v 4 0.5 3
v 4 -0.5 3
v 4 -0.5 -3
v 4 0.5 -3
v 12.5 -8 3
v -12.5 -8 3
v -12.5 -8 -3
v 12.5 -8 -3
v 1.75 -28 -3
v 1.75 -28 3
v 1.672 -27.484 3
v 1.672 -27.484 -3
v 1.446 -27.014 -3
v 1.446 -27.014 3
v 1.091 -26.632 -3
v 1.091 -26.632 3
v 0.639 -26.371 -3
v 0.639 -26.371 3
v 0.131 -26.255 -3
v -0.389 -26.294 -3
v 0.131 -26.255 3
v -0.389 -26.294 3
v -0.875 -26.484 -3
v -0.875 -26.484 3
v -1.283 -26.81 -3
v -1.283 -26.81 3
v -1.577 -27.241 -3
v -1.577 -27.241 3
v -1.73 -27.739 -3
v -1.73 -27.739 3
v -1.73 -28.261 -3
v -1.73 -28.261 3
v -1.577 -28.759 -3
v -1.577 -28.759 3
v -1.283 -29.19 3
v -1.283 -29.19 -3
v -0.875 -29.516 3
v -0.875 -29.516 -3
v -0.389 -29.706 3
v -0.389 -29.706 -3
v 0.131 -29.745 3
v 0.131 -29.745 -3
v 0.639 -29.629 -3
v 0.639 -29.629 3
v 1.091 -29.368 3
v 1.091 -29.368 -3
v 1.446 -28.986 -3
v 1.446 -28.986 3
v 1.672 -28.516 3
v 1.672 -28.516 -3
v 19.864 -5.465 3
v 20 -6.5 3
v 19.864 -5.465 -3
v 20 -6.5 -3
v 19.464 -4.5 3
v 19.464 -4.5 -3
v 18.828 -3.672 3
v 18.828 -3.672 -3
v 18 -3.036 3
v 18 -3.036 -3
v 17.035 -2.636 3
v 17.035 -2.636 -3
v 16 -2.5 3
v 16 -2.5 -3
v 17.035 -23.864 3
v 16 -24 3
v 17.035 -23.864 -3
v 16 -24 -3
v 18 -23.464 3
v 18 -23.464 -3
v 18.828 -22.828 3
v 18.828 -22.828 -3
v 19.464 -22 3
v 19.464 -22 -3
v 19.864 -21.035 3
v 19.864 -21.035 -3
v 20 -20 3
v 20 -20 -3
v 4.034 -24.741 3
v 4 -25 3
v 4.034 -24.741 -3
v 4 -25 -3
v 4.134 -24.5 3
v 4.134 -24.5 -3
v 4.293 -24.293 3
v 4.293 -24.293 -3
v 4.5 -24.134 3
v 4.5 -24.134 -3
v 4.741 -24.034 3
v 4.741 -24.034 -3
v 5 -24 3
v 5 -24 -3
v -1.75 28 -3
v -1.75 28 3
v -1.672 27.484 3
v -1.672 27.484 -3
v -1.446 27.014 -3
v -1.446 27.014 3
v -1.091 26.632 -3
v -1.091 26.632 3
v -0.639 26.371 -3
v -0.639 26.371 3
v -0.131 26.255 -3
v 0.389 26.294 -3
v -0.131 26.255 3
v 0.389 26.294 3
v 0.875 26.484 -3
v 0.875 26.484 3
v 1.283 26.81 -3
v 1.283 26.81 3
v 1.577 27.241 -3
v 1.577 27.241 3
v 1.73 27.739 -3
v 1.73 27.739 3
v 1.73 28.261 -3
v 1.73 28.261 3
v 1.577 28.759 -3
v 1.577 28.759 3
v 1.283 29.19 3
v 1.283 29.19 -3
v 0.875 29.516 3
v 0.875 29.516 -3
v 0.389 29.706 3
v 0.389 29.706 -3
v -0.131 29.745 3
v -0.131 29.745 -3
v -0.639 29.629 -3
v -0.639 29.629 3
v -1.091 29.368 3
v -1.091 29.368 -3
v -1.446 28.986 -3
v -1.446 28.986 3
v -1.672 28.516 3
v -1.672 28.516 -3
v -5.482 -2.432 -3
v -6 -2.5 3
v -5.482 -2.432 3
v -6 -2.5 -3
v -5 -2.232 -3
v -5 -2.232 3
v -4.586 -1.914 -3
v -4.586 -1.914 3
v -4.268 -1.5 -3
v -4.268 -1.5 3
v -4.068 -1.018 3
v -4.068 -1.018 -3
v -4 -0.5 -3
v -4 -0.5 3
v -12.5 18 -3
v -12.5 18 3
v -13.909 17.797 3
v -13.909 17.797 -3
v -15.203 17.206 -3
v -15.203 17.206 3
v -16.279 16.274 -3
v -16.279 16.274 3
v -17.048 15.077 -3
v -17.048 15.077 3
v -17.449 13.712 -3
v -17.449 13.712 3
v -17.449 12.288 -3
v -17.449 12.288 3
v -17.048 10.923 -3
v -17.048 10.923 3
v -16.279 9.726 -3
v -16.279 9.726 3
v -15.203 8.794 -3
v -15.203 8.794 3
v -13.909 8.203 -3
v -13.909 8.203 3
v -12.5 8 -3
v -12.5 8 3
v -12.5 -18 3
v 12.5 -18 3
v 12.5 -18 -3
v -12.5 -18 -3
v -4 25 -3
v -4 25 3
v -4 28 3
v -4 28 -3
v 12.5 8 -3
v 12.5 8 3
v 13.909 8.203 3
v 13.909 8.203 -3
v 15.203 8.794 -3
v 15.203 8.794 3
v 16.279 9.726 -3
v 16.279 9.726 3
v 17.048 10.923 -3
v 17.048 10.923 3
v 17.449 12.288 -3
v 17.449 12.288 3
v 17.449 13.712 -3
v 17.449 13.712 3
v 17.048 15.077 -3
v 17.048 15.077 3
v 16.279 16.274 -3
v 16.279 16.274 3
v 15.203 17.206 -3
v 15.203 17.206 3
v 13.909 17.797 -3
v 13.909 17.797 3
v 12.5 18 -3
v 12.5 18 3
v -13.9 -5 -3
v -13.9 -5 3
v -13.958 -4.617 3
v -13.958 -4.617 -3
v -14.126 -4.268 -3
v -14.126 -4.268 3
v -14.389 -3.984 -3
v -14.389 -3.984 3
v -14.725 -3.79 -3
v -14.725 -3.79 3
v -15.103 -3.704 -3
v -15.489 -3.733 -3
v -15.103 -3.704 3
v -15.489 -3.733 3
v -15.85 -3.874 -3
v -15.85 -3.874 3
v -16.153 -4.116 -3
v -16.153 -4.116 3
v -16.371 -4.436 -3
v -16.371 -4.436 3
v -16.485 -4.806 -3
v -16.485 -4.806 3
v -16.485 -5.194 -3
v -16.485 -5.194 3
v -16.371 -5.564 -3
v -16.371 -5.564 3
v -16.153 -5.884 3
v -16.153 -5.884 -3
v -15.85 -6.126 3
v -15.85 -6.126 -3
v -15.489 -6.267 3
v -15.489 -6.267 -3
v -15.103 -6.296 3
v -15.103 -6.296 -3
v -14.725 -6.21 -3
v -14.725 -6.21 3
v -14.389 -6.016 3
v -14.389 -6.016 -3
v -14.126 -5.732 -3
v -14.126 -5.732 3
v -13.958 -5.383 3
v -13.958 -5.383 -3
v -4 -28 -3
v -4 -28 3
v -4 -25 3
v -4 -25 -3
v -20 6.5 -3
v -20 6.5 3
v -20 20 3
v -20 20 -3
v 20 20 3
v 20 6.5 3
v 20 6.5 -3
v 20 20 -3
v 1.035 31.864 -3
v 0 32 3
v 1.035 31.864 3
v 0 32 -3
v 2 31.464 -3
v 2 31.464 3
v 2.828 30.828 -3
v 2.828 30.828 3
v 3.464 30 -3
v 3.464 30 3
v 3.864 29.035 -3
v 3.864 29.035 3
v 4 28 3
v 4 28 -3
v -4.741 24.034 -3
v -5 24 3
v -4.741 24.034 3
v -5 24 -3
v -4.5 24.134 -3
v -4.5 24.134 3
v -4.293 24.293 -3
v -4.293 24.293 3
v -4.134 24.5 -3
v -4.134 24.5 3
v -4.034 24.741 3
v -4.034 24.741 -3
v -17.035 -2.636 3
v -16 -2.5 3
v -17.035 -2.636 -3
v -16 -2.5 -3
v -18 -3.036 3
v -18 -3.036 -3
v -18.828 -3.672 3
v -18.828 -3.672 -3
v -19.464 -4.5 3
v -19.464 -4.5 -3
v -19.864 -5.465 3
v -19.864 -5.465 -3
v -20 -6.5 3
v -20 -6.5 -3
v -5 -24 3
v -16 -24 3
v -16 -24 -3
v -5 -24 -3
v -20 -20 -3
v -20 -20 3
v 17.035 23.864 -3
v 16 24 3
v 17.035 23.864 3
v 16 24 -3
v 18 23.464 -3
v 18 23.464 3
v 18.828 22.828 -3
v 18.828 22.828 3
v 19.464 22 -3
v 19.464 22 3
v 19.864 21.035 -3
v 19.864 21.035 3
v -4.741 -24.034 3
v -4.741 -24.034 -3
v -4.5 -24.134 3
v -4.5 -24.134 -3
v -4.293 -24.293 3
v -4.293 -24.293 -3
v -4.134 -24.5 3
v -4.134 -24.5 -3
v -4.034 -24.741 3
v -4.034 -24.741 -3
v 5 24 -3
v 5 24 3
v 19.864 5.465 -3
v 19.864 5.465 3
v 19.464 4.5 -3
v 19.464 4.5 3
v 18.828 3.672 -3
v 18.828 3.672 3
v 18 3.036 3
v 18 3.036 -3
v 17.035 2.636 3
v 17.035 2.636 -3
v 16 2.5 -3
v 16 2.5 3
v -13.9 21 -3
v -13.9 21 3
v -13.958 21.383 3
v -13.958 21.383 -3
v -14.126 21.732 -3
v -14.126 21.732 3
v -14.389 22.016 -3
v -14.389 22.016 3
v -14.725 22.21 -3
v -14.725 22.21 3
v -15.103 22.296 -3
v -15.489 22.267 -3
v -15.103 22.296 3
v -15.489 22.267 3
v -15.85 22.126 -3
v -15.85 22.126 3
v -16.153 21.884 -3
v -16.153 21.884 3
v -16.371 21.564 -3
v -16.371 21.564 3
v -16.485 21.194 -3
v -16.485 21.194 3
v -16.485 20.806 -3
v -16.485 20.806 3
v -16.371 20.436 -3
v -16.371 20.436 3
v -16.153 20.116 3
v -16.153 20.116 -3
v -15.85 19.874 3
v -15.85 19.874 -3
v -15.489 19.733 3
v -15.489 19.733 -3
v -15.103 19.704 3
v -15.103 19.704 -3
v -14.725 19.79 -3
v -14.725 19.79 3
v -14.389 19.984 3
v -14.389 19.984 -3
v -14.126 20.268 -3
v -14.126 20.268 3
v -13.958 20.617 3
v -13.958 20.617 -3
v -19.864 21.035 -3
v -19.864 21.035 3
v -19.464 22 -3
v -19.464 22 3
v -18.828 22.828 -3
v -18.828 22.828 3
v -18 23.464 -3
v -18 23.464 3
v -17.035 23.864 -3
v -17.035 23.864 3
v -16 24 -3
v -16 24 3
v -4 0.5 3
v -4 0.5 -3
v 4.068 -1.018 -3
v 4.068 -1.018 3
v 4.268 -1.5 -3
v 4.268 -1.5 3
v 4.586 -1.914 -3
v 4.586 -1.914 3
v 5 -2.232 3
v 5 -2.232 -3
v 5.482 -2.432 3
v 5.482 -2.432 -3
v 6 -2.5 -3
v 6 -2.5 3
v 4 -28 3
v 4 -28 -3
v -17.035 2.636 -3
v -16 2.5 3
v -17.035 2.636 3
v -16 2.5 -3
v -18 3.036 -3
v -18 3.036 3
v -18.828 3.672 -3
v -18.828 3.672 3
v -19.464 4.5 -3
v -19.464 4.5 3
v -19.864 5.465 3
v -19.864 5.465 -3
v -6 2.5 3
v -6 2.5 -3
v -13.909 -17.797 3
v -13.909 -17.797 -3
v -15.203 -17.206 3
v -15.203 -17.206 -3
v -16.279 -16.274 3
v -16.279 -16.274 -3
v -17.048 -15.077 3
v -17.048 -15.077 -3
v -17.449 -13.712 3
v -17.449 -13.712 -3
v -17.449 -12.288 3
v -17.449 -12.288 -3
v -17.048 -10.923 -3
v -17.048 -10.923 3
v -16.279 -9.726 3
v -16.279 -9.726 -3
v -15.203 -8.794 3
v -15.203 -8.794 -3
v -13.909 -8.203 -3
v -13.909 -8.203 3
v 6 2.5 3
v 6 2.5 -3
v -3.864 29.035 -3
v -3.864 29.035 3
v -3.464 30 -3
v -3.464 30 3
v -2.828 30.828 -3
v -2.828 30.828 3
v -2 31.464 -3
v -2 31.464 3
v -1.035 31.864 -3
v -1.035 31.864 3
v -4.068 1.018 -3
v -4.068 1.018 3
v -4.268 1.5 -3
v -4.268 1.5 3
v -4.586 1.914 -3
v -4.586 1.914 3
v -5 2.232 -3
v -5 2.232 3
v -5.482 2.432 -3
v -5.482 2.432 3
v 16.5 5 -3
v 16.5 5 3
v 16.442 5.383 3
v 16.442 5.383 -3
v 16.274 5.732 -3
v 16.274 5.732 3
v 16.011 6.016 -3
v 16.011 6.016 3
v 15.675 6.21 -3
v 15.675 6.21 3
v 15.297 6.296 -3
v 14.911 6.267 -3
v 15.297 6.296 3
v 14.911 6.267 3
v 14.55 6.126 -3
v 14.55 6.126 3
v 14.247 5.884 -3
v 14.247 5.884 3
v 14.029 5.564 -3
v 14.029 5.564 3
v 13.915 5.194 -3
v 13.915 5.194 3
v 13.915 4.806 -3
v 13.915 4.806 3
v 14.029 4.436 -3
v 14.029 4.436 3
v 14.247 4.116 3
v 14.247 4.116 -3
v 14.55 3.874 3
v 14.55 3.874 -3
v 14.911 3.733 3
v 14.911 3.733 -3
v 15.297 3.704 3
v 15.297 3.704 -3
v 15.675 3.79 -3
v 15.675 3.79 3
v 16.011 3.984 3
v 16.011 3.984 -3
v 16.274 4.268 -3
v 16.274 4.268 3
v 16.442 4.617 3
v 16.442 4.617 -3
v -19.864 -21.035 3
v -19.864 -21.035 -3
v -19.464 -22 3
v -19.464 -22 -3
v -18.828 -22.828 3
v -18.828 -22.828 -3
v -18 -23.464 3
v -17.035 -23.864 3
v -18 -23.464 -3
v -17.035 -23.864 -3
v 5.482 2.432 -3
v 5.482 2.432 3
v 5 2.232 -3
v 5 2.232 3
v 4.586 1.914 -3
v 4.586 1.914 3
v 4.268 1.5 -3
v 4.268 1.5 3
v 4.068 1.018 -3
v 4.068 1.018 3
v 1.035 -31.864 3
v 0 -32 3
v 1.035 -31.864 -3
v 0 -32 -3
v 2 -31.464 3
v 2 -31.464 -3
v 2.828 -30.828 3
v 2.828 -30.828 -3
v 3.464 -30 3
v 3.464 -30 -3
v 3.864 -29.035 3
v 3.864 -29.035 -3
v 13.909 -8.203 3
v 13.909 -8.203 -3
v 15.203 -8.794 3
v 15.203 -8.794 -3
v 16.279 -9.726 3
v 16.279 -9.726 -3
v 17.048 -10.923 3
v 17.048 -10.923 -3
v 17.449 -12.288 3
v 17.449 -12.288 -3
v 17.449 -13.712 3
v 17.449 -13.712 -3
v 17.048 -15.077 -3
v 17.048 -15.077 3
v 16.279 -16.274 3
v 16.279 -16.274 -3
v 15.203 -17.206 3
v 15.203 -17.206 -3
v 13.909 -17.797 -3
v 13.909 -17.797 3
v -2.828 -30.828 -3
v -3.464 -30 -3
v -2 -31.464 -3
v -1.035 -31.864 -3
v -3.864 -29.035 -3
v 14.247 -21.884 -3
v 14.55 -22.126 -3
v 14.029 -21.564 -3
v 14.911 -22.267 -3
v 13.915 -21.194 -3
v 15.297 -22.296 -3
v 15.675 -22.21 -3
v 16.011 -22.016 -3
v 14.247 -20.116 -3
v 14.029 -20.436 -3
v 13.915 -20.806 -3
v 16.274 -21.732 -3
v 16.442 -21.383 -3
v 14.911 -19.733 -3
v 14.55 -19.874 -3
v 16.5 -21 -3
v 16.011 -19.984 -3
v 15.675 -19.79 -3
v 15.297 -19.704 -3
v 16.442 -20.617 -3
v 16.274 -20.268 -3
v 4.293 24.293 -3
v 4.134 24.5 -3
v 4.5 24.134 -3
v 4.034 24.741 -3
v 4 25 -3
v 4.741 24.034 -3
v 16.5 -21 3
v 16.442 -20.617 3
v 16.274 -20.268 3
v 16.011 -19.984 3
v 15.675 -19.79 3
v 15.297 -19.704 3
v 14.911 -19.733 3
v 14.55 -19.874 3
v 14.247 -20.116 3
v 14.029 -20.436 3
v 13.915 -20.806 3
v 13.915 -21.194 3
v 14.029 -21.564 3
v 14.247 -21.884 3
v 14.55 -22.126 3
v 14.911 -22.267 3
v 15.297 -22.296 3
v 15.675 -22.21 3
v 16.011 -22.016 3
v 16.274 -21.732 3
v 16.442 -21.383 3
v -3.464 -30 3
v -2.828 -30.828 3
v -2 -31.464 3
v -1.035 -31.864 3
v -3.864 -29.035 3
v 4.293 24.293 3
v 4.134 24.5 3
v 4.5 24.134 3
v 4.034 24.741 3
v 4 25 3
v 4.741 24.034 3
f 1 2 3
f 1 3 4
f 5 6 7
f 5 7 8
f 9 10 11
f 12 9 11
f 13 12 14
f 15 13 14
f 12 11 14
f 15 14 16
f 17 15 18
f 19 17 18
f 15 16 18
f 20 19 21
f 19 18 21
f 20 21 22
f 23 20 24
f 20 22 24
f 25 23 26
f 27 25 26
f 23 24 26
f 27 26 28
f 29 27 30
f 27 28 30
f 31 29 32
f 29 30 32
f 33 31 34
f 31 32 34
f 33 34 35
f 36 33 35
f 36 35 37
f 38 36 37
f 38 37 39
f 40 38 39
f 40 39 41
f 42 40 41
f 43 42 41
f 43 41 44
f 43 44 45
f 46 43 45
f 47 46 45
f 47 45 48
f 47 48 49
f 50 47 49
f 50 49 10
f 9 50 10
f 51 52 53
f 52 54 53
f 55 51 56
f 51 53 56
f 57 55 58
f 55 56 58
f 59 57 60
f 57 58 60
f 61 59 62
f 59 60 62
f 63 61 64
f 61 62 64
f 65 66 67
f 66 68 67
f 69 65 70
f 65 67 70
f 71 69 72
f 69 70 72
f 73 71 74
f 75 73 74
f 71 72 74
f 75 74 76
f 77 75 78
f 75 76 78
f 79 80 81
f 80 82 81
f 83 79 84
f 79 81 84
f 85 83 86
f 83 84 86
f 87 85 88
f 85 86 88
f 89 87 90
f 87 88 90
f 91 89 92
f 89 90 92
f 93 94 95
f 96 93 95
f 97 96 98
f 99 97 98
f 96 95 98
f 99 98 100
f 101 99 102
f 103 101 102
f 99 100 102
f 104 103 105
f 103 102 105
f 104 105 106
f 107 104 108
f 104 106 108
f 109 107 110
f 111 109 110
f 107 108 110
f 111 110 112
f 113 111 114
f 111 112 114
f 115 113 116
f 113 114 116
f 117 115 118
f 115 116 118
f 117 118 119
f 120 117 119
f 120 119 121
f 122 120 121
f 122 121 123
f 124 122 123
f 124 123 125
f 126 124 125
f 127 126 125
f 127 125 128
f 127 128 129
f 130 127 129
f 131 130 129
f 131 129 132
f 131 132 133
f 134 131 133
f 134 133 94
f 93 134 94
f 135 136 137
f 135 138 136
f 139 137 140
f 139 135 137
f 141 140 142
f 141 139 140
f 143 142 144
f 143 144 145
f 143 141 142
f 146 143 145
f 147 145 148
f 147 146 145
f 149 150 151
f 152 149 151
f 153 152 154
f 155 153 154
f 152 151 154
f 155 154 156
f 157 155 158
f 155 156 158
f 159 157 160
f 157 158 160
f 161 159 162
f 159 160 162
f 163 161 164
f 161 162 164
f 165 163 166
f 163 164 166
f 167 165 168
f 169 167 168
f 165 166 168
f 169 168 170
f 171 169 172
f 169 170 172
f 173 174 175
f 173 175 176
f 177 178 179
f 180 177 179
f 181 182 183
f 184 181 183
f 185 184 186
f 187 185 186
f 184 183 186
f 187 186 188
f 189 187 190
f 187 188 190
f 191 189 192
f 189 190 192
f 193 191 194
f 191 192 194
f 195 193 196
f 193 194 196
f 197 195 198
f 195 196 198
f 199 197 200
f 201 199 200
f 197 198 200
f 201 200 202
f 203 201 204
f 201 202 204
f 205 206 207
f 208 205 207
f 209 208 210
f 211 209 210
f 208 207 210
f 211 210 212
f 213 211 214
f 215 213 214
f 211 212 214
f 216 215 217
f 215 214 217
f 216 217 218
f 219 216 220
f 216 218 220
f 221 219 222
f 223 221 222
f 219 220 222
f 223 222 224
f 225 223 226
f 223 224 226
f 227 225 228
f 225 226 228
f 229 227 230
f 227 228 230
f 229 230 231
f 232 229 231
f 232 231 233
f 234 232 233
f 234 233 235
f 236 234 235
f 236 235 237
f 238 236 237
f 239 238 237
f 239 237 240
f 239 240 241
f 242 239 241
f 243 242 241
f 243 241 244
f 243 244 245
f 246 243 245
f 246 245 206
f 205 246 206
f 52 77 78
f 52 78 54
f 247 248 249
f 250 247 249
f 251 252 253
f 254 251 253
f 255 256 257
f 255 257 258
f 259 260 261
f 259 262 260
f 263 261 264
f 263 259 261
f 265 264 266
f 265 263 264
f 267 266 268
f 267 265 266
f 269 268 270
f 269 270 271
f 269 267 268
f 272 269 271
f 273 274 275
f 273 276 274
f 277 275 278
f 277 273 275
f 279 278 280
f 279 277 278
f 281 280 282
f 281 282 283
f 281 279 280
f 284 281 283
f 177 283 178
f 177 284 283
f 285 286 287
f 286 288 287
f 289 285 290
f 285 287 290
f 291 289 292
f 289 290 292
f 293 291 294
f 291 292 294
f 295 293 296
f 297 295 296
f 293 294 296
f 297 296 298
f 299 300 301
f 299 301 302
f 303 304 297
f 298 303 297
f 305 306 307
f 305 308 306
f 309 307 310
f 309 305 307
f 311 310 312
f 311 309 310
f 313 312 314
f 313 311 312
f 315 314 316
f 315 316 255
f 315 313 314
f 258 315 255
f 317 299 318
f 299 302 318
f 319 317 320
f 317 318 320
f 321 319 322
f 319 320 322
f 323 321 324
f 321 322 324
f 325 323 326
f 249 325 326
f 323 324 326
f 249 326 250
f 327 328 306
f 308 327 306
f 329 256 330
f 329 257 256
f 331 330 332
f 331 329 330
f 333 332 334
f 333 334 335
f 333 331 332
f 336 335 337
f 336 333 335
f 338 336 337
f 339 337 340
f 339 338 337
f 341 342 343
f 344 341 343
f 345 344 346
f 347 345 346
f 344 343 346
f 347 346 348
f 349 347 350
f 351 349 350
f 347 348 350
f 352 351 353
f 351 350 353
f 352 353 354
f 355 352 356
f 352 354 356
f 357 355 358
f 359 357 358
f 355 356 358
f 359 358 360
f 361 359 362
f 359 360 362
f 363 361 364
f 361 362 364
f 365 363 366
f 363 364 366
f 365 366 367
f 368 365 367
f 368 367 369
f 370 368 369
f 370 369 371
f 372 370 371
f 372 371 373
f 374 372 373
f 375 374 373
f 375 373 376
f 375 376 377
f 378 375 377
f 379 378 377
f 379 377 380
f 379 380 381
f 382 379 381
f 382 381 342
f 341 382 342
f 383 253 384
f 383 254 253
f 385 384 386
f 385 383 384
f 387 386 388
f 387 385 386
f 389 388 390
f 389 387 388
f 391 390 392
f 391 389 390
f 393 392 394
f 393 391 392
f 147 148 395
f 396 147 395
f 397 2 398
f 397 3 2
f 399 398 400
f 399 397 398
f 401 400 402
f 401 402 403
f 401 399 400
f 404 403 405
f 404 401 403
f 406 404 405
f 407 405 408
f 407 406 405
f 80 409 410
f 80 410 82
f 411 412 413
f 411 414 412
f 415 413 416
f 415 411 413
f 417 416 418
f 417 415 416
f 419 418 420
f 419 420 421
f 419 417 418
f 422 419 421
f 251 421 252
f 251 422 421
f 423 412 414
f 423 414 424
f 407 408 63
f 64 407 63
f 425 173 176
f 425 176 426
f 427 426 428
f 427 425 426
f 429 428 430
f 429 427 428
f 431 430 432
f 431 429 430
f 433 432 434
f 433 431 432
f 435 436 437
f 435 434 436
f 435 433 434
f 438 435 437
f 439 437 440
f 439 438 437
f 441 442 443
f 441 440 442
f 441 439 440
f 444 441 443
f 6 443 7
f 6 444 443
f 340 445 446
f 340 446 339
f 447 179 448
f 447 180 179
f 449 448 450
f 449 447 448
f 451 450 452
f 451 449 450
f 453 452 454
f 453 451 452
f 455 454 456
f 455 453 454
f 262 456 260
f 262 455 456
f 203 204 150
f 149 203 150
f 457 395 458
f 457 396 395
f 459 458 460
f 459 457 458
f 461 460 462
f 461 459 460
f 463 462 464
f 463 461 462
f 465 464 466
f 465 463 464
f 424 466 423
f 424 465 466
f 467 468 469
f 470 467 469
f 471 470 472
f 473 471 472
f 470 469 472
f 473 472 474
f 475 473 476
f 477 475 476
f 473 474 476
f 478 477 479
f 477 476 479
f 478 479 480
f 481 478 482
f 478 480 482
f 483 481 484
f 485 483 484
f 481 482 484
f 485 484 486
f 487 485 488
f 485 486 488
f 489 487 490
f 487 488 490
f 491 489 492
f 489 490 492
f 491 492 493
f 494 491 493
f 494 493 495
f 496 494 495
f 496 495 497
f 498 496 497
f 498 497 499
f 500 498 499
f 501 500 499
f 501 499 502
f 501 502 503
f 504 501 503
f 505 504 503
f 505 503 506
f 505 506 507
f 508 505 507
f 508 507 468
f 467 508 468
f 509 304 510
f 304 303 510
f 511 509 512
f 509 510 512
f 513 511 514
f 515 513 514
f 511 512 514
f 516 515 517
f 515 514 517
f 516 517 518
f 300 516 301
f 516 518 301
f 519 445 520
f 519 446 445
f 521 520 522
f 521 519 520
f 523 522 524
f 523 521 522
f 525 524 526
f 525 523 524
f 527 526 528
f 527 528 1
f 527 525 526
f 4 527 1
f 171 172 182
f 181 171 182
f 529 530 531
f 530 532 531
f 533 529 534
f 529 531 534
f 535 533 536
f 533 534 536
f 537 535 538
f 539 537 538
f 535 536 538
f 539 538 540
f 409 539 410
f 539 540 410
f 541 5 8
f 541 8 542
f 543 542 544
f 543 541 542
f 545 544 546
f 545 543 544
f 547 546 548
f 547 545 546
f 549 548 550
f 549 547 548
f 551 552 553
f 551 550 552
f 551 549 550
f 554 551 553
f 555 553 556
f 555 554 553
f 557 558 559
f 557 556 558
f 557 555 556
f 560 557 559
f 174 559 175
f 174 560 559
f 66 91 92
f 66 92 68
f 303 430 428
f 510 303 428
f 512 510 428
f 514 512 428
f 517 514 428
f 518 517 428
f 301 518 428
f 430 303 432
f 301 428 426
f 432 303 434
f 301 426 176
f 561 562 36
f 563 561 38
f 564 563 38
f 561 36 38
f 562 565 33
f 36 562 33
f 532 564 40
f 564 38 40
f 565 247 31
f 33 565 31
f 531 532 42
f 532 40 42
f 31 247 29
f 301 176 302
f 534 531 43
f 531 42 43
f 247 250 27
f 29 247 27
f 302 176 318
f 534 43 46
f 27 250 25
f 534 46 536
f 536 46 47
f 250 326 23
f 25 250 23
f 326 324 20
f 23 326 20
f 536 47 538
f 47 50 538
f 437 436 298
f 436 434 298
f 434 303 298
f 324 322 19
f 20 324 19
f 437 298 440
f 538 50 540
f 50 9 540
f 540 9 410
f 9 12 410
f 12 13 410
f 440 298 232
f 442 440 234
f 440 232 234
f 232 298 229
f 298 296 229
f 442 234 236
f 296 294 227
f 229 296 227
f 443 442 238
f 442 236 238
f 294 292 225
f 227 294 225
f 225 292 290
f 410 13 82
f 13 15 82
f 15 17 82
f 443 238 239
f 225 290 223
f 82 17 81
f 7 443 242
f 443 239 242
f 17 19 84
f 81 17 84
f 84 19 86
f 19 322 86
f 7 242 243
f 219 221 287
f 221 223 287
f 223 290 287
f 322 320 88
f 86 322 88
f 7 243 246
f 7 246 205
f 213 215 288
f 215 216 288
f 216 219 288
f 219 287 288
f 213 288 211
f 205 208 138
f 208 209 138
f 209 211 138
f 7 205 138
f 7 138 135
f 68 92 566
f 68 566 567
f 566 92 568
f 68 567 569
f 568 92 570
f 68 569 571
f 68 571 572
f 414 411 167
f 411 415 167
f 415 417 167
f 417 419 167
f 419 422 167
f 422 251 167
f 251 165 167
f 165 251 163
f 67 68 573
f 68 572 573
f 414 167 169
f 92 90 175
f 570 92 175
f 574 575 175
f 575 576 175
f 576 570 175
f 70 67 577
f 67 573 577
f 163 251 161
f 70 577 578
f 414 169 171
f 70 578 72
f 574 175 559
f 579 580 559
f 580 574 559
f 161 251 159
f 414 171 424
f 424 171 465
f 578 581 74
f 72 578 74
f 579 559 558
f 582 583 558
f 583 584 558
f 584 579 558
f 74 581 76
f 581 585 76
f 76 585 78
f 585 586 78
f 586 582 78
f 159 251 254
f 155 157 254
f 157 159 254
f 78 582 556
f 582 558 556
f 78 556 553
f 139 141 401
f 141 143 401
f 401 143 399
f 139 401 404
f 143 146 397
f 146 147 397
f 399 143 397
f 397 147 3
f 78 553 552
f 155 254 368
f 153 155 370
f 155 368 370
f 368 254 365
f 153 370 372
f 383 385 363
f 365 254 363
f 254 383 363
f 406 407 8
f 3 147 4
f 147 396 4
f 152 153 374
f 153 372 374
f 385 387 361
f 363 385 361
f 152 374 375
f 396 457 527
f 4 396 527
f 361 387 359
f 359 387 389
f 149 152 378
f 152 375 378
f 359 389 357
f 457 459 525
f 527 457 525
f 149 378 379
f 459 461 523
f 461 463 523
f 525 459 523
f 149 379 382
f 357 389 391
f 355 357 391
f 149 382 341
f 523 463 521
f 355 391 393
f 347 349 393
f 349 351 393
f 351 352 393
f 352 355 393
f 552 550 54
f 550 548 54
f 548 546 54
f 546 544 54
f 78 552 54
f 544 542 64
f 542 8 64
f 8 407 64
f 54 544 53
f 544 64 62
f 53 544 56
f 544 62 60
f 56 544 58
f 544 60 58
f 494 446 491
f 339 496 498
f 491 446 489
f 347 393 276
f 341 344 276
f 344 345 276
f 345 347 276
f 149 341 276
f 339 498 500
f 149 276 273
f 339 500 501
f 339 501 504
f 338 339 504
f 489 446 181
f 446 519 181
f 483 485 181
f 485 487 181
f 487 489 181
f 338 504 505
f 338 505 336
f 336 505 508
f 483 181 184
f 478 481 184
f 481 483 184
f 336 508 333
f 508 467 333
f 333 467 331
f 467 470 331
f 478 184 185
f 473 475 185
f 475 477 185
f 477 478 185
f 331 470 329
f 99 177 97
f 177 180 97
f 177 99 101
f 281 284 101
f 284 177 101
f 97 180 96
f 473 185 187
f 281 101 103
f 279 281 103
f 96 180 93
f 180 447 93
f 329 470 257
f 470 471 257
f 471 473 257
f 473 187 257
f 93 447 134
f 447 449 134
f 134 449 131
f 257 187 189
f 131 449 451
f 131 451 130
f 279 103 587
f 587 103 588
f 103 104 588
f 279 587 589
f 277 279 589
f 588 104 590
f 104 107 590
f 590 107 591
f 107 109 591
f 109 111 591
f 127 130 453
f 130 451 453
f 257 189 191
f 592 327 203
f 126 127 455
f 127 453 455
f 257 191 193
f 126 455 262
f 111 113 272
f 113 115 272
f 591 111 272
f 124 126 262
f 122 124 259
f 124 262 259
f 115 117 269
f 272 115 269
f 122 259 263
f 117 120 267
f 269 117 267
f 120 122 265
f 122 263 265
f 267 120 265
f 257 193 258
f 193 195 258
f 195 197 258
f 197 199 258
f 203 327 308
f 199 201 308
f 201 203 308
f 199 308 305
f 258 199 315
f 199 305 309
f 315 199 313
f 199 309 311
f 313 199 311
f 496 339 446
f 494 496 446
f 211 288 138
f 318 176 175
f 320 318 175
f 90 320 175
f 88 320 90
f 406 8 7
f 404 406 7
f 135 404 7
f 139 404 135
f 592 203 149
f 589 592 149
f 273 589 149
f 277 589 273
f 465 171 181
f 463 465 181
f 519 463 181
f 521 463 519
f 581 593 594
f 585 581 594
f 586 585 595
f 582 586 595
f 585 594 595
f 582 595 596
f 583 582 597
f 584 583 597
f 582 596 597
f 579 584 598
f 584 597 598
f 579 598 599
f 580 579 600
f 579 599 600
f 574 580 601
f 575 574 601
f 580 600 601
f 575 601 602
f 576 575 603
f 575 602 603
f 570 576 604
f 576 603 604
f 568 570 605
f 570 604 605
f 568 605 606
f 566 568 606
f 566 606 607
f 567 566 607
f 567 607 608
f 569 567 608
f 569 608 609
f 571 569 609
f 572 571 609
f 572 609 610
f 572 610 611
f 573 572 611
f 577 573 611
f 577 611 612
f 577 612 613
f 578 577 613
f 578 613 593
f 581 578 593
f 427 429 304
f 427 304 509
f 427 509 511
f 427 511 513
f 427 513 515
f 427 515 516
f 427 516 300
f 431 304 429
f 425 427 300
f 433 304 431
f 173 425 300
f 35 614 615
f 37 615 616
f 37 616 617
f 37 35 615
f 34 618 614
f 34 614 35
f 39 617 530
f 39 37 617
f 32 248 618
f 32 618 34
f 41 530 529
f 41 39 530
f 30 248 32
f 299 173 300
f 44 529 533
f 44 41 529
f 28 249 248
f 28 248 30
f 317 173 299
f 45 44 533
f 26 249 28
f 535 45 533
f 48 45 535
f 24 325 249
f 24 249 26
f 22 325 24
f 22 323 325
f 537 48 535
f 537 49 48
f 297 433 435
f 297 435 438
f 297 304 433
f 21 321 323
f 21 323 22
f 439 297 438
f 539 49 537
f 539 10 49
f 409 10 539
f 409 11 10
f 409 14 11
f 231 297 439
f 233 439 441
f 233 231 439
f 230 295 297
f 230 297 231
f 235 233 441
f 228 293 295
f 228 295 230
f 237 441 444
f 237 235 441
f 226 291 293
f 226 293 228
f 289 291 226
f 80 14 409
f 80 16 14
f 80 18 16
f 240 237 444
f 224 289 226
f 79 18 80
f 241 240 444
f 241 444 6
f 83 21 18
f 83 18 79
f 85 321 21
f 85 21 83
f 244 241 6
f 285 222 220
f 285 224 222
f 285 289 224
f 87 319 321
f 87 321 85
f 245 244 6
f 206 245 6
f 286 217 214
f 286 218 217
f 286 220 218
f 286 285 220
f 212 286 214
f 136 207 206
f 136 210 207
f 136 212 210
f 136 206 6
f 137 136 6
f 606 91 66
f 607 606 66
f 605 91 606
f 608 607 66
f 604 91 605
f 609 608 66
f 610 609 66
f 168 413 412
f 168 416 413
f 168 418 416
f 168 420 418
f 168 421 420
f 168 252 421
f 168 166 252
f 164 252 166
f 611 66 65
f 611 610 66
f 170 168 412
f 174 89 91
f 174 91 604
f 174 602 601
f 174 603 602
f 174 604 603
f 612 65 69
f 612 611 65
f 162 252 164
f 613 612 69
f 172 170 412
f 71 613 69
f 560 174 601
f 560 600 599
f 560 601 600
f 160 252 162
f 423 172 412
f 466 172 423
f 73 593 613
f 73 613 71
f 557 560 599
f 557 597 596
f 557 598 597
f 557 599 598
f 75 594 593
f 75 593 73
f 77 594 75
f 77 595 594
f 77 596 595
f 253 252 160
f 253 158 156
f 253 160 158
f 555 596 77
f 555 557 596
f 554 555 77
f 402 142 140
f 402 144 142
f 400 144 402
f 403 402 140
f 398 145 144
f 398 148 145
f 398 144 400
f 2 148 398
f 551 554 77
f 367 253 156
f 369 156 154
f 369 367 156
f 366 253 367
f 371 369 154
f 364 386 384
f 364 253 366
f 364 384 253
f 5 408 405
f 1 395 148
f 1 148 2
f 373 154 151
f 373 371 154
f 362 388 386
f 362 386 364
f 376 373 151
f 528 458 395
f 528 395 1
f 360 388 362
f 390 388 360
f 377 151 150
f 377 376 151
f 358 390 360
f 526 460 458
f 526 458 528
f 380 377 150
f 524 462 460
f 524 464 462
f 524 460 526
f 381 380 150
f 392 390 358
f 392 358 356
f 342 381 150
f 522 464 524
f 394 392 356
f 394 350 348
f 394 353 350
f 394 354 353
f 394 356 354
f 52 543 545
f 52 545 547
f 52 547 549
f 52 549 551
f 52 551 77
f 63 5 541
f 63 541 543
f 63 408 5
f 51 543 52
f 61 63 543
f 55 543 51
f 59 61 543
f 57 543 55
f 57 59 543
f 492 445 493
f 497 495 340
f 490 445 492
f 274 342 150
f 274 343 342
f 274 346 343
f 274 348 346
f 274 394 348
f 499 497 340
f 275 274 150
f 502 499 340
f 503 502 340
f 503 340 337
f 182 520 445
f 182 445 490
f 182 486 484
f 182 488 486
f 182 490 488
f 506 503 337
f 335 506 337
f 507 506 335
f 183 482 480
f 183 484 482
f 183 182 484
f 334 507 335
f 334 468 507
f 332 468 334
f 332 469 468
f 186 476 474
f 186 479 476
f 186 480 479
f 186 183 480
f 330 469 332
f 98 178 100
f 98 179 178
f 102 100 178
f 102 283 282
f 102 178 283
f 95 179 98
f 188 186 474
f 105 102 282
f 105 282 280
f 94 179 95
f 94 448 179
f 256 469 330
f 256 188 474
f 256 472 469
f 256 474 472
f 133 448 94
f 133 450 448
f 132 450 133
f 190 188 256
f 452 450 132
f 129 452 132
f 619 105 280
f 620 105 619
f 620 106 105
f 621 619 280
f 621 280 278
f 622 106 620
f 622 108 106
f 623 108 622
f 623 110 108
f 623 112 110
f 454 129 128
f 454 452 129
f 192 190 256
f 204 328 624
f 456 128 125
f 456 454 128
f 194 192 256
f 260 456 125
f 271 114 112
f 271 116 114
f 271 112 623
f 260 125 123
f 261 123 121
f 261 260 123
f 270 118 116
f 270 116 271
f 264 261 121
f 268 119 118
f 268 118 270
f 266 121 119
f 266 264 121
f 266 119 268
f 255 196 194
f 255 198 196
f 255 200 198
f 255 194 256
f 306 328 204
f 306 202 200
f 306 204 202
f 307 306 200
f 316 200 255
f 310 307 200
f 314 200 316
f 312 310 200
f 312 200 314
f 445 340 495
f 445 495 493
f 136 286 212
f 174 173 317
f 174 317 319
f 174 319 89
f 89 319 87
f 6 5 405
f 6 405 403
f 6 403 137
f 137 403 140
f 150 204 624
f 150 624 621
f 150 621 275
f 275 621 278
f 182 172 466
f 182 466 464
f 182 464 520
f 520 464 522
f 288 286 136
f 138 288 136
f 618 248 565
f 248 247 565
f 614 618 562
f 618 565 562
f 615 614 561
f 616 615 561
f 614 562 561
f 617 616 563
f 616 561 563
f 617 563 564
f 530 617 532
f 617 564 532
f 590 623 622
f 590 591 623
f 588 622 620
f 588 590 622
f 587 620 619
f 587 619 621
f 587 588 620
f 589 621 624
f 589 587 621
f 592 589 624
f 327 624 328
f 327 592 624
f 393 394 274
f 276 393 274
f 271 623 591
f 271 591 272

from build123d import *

# Parameters (mm, degrees)
SKETCH1_W           = 40
SKETCH1_H           = 64
BOSS_EXTRUDE1_DEPTH = 3
SKETCH3_R           = 1.3
CUT_EXTRUDE2_DEPTH  = 39.209946349
SKETCH4_R           = 1.75
CUT_EXTRUDE3_DEPTH  = 39.209946349
SKETCH5_W           = 16
SKETCH5_H           = 5
SKETCH5_H_2         = 8
CUT_EXTRUDE4_DEPTH  = 39.209946349
FILLET1_R           = 2
FILLET2_R           = 4
FILLET3_R           = 1


with BuildPart() as part:
    # Sketch1 → Boss-Extrude1 (new, symmetric)
    with BuildSketch(Plane.XY):
        Rectangle(SKETCH1_W, SKETCH1_H)
    extrude(amount=BOSS_EXTRUDE1_DEPTH, both=True)

    # Sketch3 → Cut-Extrude2 (cut, through all)
    with BuildSketch(Plane.XY.offset(3)):
        with Locations((-15.2, 21)):
            Circle(SKETCH3_R)
        with Locations((15.2, 5)):
            Circle(SKETCH3_R)
        with Locations((-15.2, -5)):
            Circle(SKETCH3_R)
        with Locations((15.2, -21)):
            Circle(SKETCH3_R)
    extrude(amount=-CUT_EXTRUDE2_DEPTH, mode=Mode.SUBTRACT)

    # Sketch4 → Cut-Extrude3 (cut, through all)
    with BuildSketch(Plane.XY.offset(3)):
        with Locations((0, -28)):
            Circle(SKETCH4_R)
        with Locations(Location((0, 28, 0), (0, 0, 180))):
            Circle(SKETCH4_R)
    extrude(amount=-CUT_EXTRUDE3_DEPTH, mode=Mode.SUBTRACT)

    # Sketch5 → Cut-Extrude4 (cut, through all)
    with BuildSketch(Plane.XY.offset(3)):
        with Locations((-12, 0)):
            Rectangle(SKETCH5_W, SKETCH5_H)
        with Locations((12, 0)):
            Rectangle(SKETCH5_W, SKETCH5_H)
        with Locations((12, -28)):
            Rectangle(SKETCH5_W, SKETCH5_H_2)
        with Locations((-12, -28)):
            Rectangle(SKETCH5_W, SKETCH5_H_2)
        with Locations((12, 28)):
            Rectangle(SKETCH5_W, SKETCH5_H_2)
        with Locations((-12, 28)):
            Rectangle(SKETCH5_W, SKETCH5_H_2)
        with BuildLine():
            Line((12.5, -18), (-12.5, -18))
            ThreePointArc((-12.5, -18), (-17.5, -13), (-12.5, -8))
            Line((-12.5, -8), (12.5, -8))
            ThreePointArc((12.5, -8), (17.5, -13), (12.5, -18))
        make_face()
        with BuildLine():
            Line((12.5, 18), (-12.5, 18))
            ThreePointArc((-12.5, 18), (-17.5, 13), (-12.5, 8))
            Line((-12.5, 8), (12.5, 8))
            ThreePointArc((12.5, 8), (17.5, 13), (12.5, 18))
        make_face()
    extrude(amount=-CUT_EXTRUDE4_DEPTH, mode=Mode.SUBTRACT)

    # Fillet1
    fillet1_edges = [part.edges().sort_by_distance(p)[0] for p in [
        (4, -2.5, 0),
        (4, 2.5, 0),
        (-4, 2.5, 0),
        (-4, -2.5, 0),
    ]]
    fillet(fillet1_edges, radius=FILLET1_R)

    # Fillet2
    fillet2_edges = [part.edges().sort_by_distance(p)[0] for p in [
        (4, -32, 0),
        (-4, -32, 0),
        (-4, 32, 0),
        (4, 32, 0),
        (20, 24, 0),
        (20, 2.5, 0),
        (-20, 24, 0),
        (-20, 2.5, 0),
        (-20, -24, 0),
        (-20, -2.5, 0),
        (20, -24, 0),
        (20, -2.5, 0),
    ]]
    fillet(fillet2_edges, radius=FILLET2_R - 0.0001)  # a hair under: the kernel refuses the full size

    # Fillet3
    fillet3_edges = [part.edges().sort_by_distance(p)[0] for p in [
        (4, 24, 0),
        (4, -24, 0),
        (-4, -24, 0),
        (-4, 24, 0),
    ]]
    fillet(fillet3_edges, radius=FILLET3_R)


solid = part.part
